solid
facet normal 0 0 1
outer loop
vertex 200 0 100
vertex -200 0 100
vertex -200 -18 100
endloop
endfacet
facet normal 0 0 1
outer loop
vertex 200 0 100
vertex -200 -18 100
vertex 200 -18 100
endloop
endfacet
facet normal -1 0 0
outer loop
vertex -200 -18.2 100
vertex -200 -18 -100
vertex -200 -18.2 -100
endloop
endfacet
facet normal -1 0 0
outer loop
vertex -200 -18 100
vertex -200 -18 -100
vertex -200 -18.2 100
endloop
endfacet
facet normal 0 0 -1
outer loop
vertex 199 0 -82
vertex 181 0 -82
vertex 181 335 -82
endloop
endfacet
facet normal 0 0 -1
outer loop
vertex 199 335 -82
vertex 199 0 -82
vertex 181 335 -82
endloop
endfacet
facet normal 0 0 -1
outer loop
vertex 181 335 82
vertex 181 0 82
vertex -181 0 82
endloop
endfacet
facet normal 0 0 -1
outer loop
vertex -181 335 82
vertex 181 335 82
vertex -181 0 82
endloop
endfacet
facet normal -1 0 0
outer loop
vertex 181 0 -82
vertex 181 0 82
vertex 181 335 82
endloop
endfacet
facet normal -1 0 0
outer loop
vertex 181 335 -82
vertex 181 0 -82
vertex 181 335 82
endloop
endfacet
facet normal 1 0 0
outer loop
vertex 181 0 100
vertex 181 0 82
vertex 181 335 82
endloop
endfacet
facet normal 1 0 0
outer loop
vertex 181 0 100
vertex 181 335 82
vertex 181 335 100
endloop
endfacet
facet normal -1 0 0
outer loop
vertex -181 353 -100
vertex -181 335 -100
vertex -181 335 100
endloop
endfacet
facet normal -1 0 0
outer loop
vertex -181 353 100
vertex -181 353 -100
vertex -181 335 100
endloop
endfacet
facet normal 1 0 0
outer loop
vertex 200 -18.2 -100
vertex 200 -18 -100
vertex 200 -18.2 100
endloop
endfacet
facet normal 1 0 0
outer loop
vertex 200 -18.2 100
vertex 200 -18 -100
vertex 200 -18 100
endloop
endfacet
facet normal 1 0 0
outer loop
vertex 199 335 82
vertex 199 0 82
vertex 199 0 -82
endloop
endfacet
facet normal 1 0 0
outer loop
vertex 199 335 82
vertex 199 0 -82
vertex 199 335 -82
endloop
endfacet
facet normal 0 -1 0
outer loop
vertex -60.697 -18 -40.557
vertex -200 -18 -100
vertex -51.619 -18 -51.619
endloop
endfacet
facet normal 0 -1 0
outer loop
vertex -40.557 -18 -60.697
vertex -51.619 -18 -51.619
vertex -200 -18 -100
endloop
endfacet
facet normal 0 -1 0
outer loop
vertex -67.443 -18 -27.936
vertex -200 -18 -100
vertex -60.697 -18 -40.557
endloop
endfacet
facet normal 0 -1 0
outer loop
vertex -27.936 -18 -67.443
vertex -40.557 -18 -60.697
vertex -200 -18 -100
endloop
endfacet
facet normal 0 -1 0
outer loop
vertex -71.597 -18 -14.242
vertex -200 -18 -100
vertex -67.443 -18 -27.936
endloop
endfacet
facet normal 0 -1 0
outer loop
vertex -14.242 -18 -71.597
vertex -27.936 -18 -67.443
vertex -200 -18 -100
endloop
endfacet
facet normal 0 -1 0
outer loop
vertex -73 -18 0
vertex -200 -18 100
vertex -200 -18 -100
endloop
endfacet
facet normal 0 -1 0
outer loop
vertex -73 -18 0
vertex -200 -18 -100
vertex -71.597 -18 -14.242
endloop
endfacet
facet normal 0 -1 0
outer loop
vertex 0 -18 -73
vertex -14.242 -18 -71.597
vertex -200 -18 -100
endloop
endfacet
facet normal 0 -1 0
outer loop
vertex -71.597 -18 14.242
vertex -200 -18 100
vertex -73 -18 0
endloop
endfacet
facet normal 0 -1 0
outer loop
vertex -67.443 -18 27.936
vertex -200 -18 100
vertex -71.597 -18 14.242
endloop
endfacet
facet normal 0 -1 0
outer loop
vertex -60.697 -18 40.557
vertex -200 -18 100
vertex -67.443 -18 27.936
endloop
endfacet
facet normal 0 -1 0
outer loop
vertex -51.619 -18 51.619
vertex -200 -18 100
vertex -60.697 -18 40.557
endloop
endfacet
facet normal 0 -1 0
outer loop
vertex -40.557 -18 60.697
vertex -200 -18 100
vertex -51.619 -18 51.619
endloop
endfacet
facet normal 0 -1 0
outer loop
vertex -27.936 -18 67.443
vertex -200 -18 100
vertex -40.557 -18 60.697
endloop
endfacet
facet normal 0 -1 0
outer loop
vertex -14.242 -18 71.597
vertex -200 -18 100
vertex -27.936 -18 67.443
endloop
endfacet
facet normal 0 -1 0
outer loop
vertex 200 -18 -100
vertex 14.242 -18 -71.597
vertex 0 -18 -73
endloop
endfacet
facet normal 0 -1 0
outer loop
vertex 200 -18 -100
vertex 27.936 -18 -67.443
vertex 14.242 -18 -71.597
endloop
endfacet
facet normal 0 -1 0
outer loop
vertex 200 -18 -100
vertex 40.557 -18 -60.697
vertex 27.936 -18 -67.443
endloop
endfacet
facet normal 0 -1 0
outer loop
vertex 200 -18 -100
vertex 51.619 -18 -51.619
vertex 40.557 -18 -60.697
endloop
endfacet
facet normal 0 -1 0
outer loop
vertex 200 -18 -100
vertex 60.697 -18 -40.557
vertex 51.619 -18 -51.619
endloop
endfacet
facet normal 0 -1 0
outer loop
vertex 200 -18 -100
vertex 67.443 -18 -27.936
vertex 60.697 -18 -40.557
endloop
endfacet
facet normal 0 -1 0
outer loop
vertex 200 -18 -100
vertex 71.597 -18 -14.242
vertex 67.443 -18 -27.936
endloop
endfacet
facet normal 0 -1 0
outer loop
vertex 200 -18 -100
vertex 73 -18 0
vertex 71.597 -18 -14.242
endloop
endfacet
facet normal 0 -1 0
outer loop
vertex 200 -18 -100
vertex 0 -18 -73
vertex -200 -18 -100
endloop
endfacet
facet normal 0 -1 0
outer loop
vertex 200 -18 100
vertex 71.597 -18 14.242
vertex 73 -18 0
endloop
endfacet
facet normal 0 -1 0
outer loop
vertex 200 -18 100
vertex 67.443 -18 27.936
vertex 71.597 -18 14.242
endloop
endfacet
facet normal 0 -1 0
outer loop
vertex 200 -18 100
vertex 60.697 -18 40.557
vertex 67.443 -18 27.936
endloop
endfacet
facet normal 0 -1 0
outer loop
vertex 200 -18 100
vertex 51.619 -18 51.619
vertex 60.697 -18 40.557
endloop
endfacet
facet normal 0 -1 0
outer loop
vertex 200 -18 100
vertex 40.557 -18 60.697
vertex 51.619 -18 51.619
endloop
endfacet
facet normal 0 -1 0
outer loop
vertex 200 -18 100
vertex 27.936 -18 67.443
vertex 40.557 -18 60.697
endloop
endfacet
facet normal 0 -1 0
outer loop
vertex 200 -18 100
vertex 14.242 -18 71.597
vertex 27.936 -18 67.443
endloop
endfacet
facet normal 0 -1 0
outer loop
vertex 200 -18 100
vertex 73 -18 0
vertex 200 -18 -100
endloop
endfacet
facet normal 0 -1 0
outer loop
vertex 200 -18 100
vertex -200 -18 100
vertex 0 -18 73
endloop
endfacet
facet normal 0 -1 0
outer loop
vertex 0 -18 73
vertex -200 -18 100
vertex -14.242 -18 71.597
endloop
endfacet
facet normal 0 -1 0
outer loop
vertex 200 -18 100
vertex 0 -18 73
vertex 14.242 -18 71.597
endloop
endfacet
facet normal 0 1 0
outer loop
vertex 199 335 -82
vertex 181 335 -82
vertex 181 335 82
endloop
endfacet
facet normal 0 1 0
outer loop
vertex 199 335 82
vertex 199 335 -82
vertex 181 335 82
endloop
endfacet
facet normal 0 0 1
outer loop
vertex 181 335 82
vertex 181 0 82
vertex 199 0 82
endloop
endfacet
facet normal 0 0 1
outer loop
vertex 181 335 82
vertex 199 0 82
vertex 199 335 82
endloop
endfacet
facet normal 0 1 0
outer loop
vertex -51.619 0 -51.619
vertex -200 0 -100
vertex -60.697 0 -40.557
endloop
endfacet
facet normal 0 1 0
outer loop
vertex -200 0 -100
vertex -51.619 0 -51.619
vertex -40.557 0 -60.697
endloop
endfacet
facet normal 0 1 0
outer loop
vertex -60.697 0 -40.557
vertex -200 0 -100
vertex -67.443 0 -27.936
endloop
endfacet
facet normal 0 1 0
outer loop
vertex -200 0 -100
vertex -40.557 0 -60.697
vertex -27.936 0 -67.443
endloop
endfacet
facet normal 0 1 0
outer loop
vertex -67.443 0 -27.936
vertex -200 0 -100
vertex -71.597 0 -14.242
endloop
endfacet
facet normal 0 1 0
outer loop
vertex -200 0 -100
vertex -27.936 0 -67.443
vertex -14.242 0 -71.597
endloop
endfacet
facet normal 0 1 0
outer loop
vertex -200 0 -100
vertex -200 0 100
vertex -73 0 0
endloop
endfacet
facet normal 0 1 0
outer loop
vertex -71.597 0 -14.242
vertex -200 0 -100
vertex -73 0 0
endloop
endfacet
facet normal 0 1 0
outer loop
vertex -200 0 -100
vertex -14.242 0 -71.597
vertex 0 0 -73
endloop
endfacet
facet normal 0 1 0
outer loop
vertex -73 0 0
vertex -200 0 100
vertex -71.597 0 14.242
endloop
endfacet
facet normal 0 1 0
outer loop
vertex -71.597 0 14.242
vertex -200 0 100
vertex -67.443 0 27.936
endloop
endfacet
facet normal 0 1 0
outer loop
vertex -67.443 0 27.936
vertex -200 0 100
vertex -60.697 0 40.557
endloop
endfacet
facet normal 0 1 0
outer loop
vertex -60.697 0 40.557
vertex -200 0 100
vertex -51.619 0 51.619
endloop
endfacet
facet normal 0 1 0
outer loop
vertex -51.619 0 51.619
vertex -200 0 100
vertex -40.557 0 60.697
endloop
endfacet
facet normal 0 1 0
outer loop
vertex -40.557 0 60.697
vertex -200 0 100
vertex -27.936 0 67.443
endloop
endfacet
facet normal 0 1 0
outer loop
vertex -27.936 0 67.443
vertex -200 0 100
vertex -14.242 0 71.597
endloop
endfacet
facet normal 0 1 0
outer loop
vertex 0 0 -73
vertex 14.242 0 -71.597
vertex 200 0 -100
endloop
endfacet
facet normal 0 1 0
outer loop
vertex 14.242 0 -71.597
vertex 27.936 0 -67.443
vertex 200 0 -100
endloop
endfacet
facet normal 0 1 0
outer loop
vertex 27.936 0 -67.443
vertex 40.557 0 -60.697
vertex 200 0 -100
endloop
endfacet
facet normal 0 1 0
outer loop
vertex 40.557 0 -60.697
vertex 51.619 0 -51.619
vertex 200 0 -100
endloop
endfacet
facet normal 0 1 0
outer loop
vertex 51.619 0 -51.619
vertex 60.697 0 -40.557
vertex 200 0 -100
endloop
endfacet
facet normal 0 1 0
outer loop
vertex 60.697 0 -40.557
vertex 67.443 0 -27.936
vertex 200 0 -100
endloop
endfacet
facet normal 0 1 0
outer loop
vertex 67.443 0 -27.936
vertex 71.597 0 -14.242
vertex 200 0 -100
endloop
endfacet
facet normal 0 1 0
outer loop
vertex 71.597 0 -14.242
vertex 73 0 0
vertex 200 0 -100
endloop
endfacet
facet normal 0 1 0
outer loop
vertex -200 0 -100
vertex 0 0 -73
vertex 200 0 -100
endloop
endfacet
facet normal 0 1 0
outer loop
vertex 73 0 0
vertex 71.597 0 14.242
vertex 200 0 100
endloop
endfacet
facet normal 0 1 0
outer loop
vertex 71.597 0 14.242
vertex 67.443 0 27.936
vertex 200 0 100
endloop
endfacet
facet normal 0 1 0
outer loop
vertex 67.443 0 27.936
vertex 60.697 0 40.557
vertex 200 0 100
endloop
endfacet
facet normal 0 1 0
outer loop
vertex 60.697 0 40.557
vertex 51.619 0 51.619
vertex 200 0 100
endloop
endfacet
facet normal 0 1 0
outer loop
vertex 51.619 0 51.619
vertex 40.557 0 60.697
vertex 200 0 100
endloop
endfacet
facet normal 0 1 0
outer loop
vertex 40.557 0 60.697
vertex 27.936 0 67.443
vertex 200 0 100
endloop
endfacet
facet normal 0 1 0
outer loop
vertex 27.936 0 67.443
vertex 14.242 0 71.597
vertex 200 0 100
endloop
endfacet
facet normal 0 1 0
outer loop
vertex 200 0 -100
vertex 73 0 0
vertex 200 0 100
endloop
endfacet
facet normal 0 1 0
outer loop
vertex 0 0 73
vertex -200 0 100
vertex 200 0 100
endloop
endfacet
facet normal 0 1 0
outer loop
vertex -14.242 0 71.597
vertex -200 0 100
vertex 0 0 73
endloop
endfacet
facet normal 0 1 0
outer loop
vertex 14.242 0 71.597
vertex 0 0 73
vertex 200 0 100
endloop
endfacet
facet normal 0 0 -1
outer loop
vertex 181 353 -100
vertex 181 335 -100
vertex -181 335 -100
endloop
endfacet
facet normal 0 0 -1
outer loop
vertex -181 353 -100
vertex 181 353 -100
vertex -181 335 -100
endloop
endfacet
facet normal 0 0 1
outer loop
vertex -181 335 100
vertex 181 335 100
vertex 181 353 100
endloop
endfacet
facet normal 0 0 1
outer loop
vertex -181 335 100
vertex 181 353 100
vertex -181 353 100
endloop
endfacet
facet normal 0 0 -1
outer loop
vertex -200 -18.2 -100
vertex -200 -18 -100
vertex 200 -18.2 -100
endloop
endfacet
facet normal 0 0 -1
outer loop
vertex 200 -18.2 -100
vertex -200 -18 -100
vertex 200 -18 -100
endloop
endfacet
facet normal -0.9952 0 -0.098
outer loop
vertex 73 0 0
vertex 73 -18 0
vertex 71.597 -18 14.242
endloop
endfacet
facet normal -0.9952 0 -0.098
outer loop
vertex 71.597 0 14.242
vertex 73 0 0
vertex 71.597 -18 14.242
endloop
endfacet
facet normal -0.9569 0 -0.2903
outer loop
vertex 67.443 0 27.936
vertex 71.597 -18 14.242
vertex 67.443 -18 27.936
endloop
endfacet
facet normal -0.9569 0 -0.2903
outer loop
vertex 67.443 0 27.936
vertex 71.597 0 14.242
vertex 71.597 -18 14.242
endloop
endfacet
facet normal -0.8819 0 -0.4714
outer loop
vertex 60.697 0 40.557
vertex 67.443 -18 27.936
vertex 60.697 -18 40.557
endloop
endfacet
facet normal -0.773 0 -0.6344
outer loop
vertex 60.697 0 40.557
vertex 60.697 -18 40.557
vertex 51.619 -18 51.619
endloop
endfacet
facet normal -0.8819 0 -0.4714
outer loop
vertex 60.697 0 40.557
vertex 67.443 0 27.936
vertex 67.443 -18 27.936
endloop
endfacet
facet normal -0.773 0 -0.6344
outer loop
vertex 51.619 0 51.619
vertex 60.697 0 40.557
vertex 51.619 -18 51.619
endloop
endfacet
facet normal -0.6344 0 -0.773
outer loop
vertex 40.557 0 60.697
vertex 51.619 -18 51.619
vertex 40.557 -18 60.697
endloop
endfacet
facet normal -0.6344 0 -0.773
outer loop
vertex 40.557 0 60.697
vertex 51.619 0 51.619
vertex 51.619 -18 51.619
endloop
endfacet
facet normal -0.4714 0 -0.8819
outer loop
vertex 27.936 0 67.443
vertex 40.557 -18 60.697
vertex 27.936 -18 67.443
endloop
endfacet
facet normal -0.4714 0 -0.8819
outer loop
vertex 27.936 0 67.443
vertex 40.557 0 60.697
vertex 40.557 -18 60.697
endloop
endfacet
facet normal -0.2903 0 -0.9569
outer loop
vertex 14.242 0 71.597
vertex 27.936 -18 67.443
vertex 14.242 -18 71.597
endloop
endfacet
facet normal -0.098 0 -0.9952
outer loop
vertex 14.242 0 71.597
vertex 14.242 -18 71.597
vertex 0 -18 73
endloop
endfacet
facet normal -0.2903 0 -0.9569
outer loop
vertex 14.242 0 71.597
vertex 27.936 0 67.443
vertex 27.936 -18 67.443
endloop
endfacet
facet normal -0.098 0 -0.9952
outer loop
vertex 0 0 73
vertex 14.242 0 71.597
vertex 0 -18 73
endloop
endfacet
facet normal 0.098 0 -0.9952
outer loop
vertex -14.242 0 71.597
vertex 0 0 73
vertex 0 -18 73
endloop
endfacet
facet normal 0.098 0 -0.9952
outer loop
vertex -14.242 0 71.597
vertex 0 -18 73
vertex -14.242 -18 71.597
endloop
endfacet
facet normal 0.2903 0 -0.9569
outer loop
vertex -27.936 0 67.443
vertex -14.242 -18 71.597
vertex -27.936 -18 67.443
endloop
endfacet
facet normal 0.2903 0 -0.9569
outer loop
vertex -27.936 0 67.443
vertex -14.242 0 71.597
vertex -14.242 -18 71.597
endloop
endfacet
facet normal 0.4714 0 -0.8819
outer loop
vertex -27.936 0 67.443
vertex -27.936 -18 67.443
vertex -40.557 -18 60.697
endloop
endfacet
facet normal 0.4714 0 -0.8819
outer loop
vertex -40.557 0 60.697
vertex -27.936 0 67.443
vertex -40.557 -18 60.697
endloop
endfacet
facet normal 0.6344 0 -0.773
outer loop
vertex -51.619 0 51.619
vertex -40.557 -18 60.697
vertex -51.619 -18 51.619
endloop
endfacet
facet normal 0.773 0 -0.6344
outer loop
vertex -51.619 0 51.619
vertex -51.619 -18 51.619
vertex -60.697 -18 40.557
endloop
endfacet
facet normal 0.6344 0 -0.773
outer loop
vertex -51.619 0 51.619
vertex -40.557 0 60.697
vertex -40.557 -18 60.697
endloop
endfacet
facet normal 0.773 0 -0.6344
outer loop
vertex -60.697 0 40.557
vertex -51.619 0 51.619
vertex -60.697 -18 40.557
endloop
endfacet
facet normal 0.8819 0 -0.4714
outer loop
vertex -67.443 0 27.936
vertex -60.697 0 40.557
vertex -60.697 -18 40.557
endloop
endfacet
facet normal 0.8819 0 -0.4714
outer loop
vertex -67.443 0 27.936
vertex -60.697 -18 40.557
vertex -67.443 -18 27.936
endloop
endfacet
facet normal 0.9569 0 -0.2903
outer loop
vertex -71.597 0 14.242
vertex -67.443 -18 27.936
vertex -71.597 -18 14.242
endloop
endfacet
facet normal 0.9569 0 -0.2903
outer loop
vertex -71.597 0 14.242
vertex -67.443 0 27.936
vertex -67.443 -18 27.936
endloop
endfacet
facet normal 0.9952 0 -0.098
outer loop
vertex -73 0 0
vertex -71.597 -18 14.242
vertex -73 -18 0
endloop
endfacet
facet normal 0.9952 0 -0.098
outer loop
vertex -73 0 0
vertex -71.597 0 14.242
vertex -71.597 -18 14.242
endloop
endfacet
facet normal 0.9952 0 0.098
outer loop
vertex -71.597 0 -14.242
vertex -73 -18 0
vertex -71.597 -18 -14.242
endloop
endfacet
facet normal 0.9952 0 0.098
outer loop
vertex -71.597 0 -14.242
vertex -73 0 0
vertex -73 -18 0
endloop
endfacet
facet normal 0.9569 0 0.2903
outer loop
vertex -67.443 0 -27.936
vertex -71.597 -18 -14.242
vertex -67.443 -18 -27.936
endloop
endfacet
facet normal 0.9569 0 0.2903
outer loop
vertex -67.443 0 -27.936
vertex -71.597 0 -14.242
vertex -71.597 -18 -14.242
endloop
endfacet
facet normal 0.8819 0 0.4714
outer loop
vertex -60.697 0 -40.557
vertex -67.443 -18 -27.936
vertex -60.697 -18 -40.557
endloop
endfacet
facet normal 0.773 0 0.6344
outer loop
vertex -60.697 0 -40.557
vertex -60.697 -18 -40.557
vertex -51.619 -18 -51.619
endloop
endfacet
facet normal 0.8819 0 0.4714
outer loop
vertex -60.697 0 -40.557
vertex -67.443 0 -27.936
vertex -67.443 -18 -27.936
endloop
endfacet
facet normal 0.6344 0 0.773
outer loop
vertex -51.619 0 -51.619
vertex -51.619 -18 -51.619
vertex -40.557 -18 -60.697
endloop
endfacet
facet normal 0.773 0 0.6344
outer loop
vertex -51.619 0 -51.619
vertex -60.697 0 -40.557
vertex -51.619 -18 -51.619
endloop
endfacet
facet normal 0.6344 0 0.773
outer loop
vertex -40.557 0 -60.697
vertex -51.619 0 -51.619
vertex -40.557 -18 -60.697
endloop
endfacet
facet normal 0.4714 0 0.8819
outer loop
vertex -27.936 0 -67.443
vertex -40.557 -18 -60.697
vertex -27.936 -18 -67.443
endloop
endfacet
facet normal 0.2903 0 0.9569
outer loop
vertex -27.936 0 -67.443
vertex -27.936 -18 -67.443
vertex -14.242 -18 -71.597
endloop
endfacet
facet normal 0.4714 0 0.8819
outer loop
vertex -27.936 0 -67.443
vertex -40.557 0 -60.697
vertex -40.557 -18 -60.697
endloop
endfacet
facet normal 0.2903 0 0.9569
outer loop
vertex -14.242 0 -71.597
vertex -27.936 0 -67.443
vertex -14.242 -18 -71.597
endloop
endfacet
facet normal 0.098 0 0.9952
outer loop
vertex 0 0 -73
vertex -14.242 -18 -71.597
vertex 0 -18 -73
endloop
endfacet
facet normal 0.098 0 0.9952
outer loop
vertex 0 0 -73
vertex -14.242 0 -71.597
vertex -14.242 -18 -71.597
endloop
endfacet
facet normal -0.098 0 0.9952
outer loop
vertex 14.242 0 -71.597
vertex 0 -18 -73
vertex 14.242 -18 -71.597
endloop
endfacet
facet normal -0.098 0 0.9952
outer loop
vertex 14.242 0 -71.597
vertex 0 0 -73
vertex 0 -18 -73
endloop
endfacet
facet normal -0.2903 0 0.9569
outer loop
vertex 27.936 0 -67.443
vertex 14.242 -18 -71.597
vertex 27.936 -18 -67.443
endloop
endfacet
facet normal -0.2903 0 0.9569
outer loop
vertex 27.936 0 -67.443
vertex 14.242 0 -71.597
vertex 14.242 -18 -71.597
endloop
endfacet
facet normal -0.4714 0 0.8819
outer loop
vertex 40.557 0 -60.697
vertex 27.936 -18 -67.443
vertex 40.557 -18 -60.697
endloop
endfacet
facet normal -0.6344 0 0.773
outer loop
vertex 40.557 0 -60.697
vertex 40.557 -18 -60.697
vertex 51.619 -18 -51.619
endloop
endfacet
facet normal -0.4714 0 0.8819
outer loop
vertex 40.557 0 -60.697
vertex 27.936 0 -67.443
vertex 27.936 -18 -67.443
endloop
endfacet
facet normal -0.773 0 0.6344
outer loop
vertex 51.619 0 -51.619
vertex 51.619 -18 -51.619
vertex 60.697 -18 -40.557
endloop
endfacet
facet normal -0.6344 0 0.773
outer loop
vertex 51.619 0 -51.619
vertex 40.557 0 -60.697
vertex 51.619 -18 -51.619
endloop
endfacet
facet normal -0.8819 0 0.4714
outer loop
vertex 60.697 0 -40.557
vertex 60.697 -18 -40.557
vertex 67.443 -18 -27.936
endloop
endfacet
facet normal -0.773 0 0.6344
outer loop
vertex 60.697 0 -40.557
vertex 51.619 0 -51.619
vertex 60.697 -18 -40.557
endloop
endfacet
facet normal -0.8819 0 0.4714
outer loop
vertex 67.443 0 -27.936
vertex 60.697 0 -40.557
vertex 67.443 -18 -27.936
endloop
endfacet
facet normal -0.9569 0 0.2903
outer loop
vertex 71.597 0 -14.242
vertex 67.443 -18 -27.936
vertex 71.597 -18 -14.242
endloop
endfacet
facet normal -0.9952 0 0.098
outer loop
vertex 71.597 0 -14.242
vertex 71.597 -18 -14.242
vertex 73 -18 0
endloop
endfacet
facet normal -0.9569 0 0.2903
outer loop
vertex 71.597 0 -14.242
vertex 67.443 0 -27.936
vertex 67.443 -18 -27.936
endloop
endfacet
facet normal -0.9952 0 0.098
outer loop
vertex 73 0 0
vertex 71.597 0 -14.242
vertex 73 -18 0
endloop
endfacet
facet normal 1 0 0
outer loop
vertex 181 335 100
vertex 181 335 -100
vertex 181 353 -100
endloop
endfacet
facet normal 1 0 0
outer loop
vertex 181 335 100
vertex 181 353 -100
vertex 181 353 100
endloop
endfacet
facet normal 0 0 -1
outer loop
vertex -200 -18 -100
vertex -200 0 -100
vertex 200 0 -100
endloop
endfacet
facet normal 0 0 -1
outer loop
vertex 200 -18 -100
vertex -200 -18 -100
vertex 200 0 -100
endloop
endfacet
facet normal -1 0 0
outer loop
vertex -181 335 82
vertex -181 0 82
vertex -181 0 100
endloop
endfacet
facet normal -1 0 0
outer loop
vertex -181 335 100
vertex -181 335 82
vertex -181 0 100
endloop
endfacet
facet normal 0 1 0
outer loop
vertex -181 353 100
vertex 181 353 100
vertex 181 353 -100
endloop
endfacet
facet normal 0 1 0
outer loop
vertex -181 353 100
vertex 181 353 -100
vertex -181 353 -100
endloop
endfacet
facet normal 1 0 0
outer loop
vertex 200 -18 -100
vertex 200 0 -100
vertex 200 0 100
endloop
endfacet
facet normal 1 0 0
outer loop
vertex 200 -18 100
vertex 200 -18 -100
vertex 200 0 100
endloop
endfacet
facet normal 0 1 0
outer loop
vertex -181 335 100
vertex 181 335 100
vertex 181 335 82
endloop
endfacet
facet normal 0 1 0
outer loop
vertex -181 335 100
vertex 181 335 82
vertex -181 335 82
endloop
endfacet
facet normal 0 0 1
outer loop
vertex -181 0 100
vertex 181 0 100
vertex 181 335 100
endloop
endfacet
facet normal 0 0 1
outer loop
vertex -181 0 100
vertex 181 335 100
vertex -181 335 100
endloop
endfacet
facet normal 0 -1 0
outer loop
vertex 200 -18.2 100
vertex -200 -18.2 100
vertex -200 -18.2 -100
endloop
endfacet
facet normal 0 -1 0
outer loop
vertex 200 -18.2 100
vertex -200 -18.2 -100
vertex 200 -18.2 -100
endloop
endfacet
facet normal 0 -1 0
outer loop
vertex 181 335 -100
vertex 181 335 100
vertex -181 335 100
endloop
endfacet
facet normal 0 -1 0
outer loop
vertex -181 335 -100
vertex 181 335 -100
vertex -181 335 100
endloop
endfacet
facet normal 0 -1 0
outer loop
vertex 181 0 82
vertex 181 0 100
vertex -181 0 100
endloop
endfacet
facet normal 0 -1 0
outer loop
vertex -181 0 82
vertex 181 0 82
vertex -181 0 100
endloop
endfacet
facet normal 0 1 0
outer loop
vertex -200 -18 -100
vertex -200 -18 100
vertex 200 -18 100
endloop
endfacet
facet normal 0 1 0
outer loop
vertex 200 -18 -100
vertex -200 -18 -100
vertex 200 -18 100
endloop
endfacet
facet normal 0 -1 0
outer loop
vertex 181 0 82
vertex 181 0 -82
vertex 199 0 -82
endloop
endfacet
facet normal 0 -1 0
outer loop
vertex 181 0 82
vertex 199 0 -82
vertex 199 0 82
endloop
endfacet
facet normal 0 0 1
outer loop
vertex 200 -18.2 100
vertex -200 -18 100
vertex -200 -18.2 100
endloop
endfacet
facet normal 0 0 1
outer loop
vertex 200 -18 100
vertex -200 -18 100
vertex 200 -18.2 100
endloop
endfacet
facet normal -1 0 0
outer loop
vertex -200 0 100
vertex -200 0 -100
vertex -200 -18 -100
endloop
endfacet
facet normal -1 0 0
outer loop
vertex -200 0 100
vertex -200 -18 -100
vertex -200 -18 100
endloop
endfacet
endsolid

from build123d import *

# Parameters (mm, degrees)
F0_W     = 400
F0_H     = 200
F0_R     = 73
F1_DEPTH = 18
F2_W     = 362
F2_H     = 18
F3_DEPTH = 335
F4_W     = 335
F4_H     = 164
F5_DEPTH = 18
F6_W     = 362
F6_H     = 200
F7_DEPTH = 18
F8_W     = 400
F8_H     = 200
F9_DEPTH = 0.2


with BuildPart() as f1:
    # F0 (on Front) → F1 (new body)
    with BuildSketch(Plane.XZ):
        Rectangle(F0_W, F0_H)
        Circle(F0_R, mode=Mode.SUBTRACT)
    extrude(amount=F1_DEPTH)


with BuildPart() as f3:
    # F2 (on face) → F3 (new body)
    with BuildSketch(Plane(origin=(0, 0, 0), x_dir=(-1, 0, 0), z_dir=(0, 1, 0))):
        with Locations((0, 91)):
            Rectangle(F2_W, F2_H)
    extrude(amount=F3_DEPTH)


with BuildPart() as f5:
    # F4 (on face) → F5 (new body)
    with BuildSketch(Plane.YZ.offset(181)):
        with Locations((167.5, 0)):
            Rectangle(F4_W, F4_H)
    extrude(amount=F5_DEPTH)


with BuildPart() as f7:
    # F6 (on face) → F7 (new body)
    with BuildSketch(Plane(origin=(0, 335, 0), x_dir=(-1, 0, 0), z_dir=(0, 1, 0))):
        Rectangle(F6_W, F6_H)
    extrude(amount=F7_DEPTH)


with BuildPart() as f9:
    # F8 (on face) → F9 (new body)
    with BuildSketch(Plane.XZ.offset(18)):
        Rectangle(F8_W, F8_H)
    extrude(amount=F9_DEPTH)


solid = Compound([f1.part, f3.part, f5.part, f7.part, f9.part])
